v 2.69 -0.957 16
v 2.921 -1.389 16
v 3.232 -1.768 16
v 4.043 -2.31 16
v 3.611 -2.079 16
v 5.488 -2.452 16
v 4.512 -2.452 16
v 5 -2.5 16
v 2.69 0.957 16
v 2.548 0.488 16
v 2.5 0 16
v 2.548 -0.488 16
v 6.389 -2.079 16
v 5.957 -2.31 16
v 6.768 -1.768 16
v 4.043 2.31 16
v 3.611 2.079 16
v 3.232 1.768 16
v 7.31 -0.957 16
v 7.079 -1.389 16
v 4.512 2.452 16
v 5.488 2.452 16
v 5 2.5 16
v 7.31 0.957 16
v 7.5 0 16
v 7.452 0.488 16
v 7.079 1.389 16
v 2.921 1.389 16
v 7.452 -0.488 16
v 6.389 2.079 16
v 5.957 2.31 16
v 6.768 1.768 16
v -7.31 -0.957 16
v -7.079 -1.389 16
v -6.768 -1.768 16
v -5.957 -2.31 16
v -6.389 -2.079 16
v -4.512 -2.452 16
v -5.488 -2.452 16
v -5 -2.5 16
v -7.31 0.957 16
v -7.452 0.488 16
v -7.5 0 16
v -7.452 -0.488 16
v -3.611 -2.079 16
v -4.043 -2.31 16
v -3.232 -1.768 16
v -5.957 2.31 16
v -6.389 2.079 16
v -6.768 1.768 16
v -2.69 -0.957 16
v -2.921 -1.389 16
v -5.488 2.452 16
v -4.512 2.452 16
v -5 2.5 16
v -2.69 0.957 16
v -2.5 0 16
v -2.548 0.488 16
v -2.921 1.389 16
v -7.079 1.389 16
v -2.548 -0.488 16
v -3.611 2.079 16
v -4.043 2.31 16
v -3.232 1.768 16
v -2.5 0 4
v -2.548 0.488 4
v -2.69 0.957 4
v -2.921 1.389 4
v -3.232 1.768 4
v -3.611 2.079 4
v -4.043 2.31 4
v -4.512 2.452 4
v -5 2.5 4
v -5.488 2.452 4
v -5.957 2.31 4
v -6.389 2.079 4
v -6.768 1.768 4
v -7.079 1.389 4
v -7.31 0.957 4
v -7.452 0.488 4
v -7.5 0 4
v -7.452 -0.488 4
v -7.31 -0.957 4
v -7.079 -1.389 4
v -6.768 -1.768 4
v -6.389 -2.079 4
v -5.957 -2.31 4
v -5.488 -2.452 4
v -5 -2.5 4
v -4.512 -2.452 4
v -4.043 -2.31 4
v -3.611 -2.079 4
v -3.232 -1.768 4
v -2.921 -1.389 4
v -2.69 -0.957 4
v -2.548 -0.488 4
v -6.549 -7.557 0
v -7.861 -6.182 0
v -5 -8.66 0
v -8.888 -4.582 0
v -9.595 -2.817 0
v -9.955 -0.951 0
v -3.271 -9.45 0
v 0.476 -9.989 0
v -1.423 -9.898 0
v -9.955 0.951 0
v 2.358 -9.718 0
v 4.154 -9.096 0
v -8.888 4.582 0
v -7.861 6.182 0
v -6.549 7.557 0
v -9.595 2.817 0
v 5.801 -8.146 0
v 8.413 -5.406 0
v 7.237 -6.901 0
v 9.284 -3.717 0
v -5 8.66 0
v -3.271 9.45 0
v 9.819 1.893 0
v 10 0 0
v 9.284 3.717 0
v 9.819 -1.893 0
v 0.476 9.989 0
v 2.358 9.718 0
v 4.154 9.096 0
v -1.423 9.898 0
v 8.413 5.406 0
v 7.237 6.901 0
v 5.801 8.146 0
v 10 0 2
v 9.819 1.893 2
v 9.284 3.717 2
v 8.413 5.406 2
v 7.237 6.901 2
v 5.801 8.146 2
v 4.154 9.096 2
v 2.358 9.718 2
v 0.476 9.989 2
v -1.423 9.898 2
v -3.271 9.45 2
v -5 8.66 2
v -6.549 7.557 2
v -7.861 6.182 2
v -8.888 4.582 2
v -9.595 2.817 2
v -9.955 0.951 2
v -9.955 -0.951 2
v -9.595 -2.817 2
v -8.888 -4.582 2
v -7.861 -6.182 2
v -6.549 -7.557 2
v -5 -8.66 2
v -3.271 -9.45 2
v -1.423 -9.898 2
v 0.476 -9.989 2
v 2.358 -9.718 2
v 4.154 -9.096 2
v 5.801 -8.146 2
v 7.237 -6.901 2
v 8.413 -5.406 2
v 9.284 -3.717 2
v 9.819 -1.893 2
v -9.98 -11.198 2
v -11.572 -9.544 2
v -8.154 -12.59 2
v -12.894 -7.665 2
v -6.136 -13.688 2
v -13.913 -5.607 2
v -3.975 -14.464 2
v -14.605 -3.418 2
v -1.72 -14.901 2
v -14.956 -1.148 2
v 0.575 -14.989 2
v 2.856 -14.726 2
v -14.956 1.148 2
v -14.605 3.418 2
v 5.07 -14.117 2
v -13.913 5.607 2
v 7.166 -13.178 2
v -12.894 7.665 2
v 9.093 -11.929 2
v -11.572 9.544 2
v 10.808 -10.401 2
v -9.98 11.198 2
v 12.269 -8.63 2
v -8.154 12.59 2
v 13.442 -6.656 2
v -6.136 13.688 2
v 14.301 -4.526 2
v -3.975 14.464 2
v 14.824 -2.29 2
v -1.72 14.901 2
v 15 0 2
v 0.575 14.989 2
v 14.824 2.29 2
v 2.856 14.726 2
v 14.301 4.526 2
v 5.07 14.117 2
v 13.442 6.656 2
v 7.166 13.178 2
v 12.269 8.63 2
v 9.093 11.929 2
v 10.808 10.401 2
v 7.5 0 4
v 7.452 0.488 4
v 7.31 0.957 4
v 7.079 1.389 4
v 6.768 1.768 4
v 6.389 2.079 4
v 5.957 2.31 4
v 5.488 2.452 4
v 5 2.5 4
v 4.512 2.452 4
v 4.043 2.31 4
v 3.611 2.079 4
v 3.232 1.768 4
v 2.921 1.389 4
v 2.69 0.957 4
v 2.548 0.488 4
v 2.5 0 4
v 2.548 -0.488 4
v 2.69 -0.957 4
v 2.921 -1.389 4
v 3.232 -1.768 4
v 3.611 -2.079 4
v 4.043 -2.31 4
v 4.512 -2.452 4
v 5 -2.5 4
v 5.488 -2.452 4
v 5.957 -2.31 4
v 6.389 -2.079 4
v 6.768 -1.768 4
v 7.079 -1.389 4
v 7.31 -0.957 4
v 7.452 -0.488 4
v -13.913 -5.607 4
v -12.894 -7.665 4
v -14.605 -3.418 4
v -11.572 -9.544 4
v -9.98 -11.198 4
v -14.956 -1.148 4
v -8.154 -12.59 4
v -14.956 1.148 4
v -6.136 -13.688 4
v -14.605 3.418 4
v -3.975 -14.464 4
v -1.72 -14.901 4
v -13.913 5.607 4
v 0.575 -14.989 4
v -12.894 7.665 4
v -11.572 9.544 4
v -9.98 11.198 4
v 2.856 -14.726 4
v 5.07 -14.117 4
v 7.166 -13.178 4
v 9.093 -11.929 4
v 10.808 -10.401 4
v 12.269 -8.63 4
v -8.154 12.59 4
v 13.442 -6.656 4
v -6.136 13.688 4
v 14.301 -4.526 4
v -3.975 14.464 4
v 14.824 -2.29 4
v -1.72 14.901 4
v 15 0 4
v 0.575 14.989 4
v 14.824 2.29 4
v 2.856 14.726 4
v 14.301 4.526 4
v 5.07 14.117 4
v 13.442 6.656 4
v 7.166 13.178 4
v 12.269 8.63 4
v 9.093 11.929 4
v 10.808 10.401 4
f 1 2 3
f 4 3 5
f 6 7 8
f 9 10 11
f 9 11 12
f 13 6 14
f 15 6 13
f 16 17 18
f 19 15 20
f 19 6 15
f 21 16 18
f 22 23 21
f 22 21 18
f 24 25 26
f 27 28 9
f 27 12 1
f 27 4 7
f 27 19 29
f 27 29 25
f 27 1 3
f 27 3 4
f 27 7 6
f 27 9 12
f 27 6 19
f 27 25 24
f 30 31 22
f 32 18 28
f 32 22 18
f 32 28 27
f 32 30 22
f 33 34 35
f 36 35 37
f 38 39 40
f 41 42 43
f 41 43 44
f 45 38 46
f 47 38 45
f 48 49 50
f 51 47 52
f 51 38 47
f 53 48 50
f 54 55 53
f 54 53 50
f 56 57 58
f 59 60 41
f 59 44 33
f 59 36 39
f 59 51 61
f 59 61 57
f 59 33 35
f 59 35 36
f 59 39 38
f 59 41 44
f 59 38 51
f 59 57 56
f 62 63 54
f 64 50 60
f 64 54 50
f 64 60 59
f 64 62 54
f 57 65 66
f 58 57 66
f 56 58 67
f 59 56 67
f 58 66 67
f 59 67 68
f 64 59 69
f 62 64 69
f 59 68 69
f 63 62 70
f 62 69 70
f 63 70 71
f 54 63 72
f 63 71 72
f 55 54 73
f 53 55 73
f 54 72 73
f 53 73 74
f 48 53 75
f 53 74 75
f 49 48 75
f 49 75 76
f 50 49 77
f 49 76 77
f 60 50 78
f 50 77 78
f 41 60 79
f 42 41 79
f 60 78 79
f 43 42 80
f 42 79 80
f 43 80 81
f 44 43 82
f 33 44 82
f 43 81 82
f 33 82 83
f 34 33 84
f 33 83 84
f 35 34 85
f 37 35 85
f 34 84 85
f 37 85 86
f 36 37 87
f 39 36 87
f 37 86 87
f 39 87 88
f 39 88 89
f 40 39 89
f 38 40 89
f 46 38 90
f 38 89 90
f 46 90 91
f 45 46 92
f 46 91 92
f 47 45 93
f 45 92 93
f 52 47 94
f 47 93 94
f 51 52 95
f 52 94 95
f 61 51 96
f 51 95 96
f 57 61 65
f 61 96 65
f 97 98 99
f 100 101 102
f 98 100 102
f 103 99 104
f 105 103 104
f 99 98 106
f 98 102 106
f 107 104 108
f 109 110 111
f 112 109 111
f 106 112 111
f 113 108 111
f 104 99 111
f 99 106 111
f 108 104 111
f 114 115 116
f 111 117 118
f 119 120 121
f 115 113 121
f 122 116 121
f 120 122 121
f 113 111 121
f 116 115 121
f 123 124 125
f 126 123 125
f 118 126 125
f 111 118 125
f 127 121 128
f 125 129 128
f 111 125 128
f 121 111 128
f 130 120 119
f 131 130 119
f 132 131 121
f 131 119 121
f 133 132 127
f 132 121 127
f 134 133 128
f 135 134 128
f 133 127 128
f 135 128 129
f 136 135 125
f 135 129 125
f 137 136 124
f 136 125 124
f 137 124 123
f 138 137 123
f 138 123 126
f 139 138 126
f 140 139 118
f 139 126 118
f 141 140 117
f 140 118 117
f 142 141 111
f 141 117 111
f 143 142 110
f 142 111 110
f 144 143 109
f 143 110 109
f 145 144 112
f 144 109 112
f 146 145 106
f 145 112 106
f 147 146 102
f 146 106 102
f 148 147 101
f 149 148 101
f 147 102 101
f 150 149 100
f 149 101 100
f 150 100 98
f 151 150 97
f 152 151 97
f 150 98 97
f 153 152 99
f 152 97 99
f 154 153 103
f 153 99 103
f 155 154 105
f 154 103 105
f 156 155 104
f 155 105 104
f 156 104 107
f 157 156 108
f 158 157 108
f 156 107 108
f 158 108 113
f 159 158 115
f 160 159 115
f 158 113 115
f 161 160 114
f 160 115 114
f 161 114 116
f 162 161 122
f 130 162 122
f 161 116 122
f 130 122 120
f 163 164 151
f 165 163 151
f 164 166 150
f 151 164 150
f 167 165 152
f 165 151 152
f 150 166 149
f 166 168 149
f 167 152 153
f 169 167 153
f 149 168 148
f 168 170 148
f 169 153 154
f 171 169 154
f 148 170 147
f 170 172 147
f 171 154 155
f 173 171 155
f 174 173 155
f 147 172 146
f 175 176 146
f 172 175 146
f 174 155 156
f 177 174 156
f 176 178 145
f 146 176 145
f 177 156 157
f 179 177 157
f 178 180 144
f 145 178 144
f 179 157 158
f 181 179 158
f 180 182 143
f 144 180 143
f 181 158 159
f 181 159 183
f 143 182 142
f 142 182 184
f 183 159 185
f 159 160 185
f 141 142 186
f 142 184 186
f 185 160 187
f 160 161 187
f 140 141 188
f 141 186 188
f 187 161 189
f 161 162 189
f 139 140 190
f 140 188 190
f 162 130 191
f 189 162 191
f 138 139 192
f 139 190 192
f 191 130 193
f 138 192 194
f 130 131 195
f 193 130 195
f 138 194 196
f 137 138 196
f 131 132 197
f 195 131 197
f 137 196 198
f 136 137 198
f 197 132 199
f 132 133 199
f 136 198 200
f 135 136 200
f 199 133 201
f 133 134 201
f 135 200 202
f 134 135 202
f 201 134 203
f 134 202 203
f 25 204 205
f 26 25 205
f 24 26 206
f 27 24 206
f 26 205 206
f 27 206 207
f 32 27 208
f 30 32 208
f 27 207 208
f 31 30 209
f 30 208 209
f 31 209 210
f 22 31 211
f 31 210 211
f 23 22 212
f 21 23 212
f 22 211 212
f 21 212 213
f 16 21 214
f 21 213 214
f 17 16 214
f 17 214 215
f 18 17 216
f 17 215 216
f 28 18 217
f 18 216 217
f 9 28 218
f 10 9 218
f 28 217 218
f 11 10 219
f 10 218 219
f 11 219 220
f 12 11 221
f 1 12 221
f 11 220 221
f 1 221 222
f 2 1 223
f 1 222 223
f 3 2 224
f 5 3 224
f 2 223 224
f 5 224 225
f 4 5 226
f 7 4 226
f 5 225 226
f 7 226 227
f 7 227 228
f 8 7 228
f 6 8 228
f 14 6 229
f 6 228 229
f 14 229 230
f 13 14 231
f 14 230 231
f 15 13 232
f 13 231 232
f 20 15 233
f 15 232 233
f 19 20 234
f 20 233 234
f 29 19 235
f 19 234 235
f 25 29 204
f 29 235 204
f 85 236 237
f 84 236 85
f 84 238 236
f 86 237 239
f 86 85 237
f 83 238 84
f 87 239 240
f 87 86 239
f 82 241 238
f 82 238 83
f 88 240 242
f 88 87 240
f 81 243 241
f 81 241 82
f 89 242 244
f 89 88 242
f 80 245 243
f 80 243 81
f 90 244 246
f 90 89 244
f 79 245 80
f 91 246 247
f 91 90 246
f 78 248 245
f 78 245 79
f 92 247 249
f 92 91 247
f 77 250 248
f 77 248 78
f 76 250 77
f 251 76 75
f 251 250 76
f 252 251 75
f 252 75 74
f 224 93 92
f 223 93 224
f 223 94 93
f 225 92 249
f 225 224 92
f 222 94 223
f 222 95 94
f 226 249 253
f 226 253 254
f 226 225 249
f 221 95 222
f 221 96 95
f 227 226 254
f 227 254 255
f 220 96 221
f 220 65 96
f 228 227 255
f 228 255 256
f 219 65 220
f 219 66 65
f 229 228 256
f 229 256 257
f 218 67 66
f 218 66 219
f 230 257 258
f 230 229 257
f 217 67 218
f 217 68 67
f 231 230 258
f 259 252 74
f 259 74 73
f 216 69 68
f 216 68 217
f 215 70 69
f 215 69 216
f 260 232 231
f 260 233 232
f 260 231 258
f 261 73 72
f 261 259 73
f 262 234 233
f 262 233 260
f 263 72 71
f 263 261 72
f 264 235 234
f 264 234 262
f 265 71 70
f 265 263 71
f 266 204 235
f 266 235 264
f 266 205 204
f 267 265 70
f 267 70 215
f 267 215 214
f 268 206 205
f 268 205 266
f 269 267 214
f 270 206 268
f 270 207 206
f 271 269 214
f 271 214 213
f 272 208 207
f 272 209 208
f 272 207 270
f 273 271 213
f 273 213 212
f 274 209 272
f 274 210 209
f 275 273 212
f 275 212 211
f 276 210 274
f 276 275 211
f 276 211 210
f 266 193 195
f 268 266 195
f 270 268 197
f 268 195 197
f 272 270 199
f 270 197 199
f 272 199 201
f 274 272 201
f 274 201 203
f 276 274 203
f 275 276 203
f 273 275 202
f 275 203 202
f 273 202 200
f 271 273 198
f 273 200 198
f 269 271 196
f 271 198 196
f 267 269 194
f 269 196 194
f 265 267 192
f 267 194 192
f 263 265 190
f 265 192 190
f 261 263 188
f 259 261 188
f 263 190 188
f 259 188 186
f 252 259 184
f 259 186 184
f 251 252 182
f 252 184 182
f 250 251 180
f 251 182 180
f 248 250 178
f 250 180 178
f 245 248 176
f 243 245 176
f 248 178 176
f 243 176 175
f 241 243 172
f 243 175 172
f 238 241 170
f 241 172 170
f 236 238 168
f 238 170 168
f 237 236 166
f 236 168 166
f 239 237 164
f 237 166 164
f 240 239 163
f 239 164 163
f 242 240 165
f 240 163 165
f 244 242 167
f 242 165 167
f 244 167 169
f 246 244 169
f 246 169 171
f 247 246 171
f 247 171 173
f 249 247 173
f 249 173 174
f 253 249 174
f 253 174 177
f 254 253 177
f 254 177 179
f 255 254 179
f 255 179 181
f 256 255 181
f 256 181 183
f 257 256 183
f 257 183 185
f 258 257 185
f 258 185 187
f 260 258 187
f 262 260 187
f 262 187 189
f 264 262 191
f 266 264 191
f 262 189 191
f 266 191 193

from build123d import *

# Parameters (mm, degrees)
F0_R     = 10
F1_DEPTH = 2
F2_R     = 15
F3_DEPTH = 2
F4_R     = 2.5
F5_DEPTH = 12


with BuildPart() as f1:
    # F0 (on Top) → F1 (new body)
    with BuildSketch(Plane.XY):
        Circle(F0_R)
    extrude(amount=F1_DEPTH)

    # F2 (on face) → F3 (join)
    with BuildSketch(Plane.XY.offset(2)):
        Circle(F2_R)
    extrude(amount=F3_DEPTH)

    # F4 (on face) → F5 (join)
    with BuildSketch(Plane.XY.offset(4)):
        with Locations((-5, 0)):
            Circle(F4_R)
        with Locations((5, 0)):
            Circle(F4_R)
    extrude(amount=F5_DEPTH)


solid = f1.part
